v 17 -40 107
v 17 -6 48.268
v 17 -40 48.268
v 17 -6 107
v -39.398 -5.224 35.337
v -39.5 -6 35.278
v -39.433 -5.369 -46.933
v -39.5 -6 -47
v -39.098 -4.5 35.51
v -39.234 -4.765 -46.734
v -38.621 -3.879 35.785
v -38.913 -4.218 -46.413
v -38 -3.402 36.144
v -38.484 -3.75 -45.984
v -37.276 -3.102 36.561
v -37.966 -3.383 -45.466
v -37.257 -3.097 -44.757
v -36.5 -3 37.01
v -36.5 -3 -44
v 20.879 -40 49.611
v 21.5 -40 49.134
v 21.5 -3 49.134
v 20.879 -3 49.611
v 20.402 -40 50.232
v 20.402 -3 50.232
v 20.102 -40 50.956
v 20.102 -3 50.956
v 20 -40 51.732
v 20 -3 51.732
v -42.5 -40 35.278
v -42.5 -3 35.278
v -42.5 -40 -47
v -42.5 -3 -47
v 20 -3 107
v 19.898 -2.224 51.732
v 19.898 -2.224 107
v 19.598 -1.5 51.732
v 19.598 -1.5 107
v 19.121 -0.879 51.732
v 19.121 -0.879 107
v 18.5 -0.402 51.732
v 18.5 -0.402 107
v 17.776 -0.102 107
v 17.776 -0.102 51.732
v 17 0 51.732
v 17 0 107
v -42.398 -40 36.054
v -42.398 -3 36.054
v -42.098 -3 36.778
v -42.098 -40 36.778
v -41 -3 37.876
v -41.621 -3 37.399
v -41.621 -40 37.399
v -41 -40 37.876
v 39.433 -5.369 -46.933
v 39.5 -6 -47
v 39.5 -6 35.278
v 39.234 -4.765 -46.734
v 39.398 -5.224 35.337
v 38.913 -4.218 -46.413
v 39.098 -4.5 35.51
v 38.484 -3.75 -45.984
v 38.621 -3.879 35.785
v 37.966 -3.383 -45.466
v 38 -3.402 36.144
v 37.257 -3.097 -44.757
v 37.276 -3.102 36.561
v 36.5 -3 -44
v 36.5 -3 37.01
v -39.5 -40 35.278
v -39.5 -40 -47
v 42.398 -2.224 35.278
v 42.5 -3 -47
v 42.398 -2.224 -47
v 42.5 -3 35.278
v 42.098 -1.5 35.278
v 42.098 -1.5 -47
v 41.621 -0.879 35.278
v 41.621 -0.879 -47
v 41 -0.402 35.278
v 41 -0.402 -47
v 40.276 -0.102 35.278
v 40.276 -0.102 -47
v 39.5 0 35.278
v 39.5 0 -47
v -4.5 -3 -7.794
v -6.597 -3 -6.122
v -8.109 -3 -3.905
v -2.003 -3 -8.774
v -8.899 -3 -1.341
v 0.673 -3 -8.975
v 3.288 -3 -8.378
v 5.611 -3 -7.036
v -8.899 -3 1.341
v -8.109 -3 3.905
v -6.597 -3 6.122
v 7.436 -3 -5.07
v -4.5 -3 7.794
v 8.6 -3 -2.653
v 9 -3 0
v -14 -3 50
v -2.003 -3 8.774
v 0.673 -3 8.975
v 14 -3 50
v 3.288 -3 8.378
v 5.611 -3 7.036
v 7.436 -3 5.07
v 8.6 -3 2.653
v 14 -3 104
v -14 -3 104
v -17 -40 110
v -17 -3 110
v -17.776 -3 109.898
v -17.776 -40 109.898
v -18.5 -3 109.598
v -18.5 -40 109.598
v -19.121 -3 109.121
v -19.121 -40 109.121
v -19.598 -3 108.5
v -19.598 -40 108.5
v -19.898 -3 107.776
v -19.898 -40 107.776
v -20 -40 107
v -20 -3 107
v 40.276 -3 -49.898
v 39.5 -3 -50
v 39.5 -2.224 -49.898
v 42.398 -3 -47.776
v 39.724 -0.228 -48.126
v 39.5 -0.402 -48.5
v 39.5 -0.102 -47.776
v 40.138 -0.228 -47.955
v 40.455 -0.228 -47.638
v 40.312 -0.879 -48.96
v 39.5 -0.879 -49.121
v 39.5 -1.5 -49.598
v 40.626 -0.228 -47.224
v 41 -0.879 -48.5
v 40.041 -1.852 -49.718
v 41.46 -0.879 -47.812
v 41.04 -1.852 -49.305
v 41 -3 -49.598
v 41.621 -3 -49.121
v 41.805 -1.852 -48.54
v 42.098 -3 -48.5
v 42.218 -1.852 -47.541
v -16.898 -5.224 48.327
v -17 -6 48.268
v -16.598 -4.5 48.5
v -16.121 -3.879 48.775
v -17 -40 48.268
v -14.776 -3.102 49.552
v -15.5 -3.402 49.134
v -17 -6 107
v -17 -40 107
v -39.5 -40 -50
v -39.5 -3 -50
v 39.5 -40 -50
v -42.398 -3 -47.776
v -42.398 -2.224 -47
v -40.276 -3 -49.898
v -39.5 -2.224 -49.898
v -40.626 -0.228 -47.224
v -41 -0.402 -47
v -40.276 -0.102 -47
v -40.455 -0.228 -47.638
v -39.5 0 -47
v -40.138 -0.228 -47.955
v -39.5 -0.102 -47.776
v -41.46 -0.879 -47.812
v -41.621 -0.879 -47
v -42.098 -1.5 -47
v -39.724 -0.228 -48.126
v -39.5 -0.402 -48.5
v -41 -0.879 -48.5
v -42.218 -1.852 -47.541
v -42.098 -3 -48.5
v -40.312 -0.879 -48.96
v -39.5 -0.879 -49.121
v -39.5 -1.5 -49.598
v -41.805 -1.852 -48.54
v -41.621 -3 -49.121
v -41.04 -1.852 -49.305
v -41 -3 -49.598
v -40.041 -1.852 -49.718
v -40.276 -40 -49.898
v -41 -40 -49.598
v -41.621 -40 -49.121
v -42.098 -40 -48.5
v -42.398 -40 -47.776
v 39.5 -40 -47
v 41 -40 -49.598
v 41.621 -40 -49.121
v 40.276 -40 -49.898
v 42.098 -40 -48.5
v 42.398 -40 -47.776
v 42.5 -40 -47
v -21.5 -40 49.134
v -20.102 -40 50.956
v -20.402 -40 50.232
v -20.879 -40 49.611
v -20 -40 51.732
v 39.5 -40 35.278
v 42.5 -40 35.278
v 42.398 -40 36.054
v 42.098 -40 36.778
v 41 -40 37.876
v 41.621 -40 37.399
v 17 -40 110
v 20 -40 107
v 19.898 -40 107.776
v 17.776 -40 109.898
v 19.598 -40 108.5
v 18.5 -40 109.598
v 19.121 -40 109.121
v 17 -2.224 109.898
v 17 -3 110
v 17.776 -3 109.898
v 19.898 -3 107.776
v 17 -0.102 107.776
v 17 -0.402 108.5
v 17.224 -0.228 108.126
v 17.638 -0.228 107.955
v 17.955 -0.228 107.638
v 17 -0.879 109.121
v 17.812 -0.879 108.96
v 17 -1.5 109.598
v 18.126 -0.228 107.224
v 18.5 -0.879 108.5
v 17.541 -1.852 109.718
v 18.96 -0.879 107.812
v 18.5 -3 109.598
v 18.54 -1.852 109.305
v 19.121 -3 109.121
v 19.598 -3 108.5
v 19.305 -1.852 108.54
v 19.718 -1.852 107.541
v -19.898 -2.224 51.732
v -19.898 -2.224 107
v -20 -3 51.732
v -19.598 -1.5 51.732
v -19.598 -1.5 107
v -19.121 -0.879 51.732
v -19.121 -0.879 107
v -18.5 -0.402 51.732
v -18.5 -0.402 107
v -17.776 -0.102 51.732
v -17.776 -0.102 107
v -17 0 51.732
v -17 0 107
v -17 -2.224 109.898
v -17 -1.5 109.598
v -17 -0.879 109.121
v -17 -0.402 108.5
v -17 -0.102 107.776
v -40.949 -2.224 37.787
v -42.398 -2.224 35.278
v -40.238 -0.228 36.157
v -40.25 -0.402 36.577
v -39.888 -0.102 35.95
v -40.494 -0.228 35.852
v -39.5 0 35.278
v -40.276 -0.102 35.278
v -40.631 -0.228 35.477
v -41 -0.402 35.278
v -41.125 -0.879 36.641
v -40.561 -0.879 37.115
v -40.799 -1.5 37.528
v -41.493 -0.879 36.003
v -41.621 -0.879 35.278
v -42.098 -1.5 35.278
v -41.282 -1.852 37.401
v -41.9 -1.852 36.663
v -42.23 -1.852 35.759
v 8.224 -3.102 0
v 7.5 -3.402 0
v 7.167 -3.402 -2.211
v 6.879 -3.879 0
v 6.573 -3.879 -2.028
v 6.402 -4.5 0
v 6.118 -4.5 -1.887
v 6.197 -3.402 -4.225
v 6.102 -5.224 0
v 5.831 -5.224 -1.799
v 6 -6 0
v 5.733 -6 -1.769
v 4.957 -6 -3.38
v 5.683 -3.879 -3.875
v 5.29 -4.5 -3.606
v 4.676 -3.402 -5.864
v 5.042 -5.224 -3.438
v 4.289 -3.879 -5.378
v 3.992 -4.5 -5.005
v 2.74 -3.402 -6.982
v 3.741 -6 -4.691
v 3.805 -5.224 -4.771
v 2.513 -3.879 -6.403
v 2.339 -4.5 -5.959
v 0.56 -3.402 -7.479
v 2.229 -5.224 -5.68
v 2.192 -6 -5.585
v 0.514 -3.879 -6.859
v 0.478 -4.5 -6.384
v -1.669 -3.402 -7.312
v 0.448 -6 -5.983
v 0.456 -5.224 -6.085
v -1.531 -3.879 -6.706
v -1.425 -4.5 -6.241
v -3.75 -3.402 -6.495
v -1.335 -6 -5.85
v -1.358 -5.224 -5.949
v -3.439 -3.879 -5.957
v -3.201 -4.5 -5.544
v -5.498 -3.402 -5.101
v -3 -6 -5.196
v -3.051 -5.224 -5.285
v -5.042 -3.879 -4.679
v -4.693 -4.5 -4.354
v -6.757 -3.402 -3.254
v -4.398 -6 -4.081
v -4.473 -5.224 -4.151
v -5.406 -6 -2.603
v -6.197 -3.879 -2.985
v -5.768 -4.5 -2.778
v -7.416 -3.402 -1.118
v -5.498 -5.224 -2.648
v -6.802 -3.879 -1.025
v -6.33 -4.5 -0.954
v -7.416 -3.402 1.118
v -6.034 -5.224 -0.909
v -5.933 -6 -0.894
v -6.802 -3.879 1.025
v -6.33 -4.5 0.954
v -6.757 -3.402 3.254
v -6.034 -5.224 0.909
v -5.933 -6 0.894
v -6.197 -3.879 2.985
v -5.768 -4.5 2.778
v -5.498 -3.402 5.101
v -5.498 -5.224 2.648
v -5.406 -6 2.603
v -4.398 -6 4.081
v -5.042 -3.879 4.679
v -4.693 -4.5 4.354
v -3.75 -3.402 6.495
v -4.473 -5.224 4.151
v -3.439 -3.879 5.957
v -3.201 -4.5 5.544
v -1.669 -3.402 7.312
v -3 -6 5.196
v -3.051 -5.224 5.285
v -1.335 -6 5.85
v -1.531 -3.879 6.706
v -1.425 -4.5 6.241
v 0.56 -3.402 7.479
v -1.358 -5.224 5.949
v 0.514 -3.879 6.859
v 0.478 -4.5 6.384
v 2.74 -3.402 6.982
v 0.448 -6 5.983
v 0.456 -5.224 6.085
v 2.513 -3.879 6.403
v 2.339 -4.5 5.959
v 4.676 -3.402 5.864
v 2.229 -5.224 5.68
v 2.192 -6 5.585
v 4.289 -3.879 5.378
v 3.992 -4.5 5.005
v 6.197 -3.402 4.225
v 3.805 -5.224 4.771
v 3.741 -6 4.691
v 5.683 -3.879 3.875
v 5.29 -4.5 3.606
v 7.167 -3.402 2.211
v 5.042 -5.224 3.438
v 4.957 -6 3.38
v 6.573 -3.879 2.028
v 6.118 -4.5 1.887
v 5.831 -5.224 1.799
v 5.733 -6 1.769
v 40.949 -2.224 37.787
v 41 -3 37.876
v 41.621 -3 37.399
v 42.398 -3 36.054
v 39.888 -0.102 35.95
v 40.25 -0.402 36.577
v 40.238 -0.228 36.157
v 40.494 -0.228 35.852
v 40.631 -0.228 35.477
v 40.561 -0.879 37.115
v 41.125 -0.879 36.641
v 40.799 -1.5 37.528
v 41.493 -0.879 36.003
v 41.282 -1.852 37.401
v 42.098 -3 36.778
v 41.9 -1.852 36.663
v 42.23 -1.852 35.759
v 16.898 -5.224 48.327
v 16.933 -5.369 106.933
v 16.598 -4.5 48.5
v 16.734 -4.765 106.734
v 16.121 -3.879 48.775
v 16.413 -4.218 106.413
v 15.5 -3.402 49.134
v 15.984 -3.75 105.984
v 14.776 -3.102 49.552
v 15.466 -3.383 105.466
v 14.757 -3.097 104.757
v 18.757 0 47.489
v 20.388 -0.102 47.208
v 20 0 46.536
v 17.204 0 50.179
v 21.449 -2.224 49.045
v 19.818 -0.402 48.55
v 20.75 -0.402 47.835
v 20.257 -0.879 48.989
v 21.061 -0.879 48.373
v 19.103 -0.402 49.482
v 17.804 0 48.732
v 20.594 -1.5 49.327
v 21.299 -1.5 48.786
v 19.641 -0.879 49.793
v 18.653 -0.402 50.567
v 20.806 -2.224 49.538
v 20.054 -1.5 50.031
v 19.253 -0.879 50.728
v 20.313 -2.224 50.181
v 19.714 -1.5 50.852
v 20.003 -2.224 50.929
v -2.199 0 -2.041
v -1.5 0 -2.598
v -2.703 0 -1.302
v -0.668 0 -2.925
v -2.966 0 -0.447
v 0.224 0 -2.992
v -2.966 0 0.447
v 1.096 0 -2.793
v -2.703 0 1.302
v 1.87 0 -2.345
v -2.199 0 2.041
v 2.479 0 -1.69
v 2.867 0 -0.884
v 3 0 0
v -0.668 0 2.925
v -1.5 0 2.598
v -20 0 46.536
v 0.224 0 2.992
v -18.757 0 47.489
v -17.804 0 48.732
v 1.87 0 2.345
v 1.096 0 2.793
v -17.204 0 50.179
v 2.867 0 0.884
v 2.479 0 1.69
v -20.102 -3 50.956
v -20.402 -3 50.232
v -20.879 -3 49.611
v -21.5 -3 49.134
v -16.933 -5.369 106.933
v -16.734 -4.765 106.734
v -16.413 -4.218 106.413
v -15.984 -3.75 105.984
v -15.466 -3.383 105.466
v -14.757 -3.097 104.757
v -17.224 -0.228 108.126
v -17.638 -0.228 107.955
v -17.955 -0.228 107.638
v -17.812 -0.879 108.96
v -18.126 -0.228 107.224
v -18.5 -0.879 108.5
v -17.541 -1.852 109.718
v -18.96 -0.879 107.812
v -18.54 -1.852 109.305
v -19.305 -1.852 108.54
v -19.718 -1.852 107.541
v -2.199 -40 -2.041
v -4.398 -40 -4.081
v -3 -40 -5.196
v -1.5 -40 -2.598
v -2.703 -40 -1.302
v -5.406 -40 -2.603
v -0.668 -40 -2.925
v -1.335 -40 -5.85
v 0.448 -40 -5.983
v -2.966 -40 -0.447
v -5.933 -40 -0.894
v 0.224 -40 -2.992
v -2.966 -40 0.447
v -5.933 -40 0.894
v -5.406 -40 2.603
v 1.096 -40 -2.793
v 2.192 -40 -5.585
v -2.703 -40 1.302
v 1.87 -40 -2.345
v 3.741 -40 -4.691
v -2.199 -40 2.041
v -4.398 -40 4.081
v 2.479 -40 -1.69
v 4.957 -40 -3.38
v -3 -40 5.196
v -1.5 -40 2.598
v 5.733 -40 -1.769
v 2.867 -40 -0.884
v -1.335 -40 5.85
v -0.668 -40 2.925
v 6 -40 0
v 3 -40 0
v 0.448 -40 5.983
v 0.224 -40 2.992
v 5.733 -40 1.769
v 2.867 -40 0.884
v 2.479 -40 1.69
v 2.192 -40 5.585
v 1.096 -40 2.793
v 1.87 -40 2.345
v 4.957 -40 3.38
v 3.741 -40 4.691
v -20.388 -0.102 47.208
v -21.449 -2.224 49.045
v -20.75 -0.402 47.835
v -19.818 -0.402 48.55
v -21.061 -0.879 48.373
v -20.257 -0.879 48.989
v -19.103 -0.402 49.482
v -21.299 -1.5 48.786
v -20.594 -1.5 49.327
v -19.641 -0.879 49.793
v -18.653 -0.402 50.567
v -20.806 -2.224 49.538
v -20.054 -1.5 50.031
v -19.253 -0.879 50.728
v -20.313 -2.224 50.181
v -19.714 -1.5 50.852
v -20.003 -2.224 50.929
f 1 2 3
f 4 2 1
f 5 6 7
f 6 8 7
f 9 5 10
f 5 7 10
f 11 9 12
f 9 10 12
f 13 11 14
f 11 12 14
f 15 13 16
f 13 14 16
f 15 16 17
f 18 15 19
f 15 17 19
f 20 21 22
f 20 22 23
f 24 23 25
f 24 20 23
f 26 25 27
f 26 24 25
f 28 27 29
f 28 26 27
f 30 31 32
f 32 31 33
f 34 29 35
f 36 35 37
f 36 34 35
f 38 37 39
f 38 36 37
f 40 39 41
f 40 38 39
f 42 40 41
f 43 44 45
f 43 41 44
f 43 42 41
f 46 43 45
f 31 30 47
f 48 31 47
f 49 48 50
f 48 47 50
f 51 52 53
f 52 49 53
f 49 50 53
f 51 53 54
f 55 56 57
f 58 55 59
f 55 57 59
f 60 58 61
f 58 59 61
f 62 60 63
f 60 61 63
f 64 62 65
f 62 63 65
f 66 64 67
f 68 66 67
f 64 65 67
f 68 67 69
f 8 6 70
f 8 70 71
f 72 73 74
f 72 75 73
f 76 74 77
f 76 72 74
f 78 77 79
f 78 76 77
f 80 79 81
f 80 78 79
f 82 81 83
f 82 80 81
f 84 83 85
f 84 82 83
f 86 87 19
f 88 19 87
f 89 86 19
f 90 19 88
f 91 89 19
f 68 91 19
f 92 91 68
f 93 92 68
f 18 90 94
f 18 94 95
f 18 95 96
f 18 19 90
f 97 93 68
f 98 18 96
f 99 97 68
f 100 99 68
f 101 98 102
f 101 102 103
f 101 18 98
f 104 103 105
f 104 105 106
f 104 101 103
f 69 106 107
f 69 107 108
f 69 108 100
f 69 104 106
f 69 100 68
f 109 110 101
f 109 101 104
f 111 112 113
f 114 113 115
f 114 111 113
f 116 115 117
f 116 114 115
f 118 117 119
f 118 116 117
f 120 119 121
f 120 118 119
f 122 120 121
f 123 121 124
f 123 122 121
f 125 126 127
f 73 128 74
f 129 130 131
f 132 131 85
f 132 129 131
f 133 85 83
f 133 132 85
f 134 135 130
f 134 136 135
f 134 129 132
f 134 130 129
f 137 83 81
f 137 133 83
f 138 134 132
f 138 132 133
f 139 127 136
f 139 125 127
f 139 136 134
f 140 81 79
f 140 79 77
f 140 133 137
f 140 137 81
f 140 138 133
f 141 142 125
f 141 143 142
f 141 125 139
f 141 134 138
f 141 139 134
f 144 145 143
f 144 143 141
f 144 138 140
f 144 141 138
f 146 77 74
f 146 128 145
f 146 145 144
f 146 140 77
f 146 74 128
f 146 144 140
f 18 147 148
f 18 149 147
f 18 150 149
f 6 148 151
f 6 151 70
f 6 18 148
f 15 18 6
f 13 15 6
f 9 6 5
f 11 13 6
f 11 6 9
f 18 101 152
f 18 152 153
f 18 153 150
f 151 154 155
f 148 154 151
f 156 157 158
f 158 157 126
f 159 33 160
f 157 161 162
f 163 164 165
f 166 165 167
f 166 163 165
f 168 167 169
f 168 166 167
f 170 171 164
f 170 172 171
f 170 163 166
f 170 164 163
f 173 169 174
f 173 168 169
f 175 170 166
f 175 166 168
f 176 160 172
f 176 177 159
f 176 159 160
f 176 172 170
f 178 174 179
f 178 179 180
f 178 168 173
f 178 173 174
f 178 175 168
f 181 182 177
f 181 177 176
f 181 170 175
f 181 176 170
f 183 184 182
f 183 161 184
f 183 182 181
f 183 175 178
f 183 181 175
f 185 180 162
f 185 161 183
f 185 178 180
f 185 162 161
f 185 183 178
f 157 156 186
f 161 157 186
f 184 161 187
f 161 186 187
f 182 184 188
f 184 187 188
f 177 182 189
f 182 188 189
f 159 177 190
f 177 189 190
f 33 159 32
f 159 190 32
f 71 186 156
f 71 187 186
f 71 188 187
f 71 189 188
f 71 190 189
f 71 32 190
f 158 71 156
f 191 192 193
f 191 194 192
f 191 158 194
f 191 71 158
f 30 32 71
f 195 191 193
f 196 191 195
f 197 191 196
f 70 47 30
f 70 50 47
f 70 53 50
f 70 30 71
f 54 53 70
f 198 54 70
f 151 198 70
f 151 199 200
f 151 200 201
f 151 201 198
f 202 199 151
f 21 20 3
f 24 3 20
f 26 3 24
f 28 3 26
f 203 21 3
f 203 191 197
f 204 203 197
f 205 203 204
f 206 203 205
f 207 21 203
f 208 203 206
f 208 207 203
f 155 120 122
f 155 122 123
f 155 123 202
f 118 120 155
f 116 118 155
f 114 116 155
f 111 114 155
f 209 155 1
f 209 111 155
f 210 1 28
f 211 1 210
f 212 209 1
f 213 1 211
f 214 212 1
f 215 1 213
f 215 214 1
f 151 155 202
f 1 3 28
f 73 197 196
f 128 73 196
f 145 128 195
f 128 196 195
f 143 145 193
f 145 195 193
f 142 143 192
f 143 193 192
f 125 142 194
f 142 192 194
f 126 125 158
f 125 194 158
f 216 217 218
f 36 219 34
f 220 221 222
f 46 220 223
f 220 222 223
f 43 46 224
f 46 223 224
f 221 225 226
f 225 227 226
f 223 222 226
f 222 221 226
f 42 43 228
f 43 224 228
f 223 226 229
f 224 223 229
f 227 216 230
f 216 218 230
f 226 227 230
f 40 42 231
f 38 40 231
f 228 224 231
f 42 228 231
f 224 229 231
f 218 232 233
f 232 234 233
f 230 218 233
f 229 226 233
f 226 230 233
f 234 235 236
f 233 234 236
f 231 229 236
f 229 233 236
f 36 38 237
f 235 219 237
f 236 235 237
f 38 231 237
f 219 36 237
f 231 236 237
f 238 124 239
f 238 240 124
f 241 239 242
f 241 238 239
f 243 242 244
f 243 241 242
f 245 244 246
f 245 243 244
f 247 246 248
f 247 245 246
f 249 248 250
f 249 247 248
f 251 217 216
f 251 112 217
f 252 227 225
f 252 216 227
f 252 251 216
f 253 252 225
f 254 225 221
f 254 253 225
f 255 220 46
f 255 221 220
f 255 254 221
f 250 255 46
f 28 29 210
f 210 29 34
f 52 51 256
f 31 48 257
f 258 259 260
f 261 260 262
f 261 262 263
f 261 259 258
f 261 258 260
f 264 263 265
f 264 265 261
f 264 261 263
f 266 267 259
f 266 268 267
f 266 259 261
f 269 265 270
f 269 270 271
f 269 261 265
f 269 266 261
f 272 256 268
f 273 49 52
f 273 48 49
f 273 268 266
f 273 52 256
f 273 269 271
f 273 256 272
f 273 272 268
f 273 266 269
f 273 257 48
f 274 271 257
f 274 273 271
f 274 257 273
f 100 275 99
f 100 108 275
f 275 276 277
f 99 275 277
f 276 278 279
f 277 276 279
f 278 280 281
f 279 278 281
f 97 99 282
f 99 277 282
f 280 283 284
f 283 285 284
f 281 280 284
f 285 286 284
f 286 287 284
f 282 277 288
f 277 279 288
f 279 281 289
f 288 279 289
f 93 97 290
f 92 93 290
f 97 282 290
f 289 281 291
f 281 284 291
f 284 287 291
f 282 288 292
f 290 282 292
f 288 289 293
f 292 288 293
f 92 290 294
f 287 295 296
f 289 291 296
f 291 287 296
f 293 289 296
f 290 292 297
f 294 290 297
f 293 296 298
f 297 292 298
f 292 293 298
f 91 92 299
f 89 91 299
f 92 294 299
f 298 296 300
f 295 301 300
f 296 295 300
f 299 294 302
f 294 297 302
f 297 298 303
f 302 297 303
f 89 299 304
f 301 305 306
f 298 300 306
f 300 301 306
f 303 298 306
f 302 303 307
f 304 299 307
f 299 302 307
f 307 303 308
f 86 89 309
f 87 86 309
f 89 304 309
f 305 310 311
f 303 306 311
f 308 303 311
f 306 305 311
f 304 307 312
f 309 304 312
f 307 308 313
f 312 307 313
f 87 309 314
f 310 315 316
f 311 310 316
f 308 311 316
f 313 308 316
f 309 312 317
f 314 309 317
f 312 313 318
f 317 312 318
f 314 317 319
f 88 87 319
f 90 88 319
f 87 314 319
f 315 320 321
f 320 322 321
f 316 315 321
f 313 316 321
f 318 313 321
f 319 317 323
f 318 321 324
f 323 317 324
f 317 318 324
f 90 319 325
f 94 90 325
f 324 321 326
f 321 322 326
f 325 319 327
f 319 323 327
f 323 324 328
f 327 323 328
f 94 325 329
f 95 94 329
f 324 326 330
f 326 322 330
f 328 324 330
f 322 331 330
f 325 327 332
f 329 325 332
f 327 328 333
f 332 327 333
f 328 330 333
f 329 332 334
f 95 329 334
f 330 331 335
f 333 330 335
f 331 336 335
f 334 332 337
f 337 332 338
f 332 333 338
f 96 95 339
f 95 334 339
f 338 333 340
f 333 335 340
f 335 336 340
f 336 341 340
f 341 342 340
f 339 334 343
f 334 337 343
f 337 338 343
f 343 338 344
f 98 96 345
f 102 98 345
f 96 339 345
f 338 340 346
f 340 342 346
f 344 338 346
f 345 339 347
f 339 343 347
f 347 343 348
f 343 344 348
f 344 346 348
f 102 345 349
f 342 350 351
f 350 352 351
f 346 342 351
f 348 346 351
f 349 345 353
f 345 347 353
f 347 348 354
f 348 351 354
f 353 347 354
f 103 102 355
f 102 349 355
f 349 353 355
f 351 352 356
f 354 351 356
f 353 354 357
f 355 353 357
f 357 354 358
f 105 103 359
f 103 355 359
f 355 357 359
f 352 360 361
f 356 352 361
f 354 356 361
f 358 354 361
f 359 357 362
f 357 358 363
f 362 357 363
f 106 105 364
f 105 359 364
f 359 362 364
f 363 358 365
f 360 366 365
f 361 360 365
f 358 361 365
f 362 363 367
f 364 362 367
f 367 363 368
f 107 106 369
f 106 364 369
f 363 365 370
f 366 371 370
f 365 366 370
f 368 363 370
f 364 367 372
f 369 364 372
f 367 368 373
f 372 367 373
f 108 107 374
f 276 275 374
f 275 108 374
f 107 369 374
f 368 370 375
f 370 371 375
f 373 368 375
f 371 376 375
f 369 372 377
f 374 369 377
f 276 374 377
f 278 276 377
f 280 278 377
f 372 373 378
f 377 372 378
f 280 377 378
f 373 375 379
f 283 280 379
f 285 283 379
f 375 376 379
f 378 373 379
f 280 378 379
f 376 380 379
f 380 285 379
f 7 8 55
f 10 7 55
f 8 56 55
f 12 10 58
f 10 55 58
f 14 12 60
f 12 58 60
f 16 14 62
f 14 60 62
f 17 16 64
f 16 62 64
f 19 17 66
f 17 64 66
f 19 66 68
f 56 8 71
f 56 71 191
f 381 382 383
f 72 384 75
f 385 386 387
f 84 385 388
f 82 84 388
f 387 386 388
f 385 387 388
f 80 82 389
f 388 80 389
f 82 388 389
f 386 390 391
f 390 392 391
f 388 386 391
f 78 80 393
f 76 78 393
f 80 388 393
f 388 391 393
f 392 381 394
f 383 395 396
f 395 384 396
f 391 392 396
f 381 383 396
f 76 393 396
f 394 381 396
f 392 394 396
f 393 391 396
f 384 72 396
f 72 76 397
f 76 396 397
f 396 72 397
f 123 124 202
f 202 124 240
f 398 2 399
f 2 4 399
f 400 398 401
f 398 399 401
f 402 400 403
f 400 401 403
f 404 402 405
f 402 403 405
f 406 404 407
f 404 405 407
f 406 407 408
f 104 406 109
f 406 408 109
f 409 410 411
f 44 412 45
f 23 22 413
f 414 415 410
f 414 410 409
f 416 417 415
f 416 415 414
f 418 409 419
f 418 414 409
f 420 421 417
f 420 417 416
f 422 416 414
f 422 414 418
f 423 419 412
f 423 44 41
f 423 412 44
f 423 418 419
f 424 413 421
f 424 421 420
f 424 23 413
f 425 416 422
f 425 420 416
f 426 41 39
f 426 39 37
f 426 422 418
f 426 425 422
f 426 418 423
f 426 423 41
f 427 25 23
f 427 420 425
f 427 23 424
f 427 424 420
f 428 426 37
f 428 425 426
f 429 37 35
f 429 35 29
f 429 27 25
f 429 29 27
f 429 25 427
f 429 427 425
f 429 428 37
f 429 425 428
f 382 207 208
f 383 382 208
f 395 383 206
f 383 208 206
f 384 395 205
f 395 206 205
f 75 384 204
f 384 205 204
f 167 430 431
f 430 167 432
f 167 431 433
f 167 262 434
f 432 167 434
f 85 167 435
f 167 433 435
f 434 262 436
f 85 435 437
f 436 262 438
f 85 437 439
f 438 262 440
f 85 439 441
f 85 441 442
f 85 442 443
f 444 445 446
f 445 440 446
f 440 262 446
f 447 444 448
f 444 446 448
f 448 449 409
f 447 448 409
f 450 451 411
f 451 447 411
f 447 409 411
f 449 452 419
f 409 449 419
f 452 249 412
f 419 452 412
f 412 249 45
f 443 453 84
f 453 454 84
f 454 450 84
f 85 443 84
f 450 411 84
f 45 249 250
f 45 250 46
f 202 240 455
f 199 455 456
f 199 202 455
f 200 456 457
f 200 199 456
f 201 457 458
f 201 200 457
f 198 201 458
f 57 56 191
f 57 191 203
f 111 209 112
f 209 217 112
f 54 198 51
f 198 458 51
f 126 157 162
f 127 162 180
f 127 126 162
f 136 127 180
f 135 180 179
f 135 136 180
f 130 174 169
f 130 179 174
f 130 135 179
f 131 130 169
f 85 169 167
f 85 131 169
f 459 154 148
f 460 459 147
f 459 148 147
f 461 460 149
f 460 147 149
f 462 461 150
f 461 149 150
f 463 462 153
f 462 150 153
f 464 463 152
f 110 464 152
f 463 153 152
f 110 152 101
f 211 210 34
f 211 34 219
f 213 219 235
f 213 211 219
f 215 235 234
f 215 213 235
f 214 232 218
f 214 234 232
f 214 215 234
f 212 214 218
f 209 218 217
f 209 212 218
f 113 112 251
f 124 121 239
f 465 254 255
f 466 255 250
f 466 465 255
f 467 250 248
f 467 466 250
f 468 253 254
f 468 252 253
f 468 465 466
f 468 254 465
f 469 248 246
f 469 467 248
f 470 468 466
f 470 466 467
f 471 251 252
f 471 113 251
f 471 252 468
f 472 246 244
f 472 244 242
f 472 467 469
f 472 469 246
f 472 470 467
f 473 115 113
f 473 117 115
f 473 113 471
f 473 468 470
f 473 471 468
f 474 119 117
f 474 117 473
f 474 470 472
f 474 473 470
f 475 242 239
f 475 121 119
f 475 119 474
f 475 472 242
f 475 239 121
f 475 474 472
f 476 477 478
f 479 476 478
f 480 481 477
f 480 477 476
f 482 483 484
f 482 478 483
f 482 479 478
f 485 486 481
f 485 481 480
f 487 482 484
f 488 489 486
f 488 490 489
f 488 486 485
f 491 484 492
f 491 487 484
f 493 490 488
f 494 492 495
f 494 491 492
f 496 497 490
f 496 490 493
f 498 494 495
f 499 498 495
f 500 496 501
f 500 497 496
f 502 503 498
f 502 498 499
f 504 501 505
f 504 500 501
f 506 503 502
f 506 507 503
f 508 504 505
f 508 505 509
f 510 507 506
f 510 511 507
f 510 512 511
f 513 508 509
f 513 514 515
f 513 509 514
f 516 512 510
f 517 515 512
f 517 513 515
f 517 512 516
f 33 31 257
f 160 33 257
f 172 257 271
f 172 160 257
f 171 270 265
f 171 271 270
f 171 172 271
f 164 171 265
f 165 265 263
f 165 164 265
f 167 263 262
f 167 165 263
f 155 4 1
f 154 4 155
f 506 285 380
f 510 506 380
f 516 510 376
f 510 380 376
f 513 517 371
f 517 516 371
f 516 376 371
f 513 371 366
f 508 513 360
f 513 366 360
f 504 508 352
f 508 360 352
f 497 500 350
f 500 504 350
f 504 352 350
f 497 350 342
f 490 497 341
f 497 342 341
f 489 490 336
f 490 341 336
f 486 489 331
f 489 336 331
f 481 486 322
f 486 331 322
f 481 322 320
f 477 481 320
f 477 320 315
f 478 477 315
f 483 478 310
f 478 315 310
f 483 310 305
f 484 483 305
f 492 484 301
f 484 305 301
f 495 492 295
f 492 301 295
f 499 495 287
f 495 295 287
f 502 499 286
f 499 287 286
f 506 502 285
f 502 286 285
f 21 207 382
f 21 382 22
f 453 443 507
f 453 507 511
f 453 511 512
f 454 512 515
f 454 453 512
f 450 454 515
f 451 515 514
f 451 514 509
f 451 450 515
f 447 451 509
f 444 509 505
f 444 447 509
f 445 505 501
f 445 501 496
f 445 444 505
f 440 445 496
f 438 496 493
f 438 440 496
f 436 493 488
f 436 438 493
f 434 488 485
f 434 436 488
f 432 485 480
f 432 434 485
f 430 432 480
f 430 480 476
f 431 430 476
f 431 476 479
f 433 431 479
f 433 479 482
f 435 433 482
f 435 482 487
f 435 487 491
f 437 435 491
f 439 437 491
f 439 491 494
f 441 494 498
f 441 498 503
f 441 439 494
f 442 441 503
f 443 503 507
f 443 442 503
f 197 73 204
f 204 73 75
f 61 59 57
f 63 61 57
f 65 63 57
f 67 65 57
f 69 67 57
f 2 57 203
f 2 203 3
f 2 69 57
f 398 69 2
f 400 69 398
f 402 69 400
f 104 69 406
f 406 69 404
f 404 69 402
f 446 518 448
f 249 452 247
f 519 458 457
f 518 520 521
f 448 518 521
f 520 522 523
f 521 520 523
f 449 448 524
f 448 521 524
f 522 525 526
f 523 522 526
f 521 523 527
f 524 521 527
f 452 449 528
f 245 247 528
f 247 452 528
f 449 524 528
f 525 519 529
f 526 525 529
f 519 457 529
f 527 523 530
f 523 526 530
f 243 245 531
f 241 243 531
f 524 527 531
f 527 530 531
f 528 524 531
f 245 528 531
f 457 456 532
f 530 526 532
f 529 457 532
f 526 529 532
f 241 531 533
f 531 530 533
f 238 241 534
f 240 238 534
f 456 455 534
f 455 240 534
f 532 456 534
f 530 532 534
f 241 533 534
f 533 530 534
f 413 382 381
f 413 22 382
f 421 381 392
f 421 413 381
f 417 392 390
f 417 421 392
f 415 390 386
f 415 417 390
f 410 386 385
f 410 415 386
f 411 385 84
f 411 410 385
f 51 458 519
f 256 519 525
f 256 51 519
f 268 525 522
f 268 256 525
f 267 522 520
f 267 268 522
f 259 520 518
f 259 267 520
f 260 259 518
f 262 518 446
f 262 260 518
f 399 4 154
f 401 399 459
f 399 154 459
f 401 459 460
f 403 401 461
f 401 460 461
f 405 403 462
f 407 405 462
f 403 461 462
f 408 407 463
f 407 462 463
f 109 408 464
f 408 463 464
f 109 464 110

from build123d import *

# Parameters (mm, degrees)
F1_R     = 3
F2_DEPTH = 40
F3_T     = -3
F4_R     = 3


with BuildPart() as f2:
    # F1 (on Front) → F2 (new body)
    with BuildSketch(Plane.XZ):
        Polygon((42.5, 37.0096189432), (20, 50), (20, 110), (-20, 110), (-20, 50), (-42.5, 37.0096189432), (-42.5, -50), (42.5, -50), align=None)
        Circle(F1_R, mode=Mode.SUBTRACT)
    extrude(amount=F2_DEPTH)

    # F3
    f3_openings = [f2.faces().sort_by_distance(p)[0] for p in [
        (0, -40, 16.88666),
    ]]
    offset(amount=F3_T, openings=f3_openings, kind=Kind.INTERSECTION)

    # F4
    f4_edges = [f2.edges().sort_by_distance(p)[0] for p in [
        (39.5, -3, -5.861216),
        (0, -3, -47),
        (-39.5, -3, -5.861216),
        (17, -3, 77.633975),
        (0, -3, 107),
        (-17, -3, 77.633975),
        (-20, -20, 110),
        (20, -20, 110),
        (42.5, -20, -50),
        (-42.5, -20, -50),
        (0, 0, 110),
        (20, 0, 80),
        (-42.5, 0, -6.495191),
        (-20, 0, 80),
        (0, 0, -50),
        (42.5, 0, -6.495191),
        (-6, -3, 0),
        (42.5, -20, 37.009619),
        (20, -20, 50),
        (31.25, 0, 43.504809),
        (-20, -20, 50),
        (-42.5, -20, 37.009619),
        (-31.25, 0, 43.504809),
    ]]
    fillet(f4_edges, radius=F4_R)


solid = f2.part
